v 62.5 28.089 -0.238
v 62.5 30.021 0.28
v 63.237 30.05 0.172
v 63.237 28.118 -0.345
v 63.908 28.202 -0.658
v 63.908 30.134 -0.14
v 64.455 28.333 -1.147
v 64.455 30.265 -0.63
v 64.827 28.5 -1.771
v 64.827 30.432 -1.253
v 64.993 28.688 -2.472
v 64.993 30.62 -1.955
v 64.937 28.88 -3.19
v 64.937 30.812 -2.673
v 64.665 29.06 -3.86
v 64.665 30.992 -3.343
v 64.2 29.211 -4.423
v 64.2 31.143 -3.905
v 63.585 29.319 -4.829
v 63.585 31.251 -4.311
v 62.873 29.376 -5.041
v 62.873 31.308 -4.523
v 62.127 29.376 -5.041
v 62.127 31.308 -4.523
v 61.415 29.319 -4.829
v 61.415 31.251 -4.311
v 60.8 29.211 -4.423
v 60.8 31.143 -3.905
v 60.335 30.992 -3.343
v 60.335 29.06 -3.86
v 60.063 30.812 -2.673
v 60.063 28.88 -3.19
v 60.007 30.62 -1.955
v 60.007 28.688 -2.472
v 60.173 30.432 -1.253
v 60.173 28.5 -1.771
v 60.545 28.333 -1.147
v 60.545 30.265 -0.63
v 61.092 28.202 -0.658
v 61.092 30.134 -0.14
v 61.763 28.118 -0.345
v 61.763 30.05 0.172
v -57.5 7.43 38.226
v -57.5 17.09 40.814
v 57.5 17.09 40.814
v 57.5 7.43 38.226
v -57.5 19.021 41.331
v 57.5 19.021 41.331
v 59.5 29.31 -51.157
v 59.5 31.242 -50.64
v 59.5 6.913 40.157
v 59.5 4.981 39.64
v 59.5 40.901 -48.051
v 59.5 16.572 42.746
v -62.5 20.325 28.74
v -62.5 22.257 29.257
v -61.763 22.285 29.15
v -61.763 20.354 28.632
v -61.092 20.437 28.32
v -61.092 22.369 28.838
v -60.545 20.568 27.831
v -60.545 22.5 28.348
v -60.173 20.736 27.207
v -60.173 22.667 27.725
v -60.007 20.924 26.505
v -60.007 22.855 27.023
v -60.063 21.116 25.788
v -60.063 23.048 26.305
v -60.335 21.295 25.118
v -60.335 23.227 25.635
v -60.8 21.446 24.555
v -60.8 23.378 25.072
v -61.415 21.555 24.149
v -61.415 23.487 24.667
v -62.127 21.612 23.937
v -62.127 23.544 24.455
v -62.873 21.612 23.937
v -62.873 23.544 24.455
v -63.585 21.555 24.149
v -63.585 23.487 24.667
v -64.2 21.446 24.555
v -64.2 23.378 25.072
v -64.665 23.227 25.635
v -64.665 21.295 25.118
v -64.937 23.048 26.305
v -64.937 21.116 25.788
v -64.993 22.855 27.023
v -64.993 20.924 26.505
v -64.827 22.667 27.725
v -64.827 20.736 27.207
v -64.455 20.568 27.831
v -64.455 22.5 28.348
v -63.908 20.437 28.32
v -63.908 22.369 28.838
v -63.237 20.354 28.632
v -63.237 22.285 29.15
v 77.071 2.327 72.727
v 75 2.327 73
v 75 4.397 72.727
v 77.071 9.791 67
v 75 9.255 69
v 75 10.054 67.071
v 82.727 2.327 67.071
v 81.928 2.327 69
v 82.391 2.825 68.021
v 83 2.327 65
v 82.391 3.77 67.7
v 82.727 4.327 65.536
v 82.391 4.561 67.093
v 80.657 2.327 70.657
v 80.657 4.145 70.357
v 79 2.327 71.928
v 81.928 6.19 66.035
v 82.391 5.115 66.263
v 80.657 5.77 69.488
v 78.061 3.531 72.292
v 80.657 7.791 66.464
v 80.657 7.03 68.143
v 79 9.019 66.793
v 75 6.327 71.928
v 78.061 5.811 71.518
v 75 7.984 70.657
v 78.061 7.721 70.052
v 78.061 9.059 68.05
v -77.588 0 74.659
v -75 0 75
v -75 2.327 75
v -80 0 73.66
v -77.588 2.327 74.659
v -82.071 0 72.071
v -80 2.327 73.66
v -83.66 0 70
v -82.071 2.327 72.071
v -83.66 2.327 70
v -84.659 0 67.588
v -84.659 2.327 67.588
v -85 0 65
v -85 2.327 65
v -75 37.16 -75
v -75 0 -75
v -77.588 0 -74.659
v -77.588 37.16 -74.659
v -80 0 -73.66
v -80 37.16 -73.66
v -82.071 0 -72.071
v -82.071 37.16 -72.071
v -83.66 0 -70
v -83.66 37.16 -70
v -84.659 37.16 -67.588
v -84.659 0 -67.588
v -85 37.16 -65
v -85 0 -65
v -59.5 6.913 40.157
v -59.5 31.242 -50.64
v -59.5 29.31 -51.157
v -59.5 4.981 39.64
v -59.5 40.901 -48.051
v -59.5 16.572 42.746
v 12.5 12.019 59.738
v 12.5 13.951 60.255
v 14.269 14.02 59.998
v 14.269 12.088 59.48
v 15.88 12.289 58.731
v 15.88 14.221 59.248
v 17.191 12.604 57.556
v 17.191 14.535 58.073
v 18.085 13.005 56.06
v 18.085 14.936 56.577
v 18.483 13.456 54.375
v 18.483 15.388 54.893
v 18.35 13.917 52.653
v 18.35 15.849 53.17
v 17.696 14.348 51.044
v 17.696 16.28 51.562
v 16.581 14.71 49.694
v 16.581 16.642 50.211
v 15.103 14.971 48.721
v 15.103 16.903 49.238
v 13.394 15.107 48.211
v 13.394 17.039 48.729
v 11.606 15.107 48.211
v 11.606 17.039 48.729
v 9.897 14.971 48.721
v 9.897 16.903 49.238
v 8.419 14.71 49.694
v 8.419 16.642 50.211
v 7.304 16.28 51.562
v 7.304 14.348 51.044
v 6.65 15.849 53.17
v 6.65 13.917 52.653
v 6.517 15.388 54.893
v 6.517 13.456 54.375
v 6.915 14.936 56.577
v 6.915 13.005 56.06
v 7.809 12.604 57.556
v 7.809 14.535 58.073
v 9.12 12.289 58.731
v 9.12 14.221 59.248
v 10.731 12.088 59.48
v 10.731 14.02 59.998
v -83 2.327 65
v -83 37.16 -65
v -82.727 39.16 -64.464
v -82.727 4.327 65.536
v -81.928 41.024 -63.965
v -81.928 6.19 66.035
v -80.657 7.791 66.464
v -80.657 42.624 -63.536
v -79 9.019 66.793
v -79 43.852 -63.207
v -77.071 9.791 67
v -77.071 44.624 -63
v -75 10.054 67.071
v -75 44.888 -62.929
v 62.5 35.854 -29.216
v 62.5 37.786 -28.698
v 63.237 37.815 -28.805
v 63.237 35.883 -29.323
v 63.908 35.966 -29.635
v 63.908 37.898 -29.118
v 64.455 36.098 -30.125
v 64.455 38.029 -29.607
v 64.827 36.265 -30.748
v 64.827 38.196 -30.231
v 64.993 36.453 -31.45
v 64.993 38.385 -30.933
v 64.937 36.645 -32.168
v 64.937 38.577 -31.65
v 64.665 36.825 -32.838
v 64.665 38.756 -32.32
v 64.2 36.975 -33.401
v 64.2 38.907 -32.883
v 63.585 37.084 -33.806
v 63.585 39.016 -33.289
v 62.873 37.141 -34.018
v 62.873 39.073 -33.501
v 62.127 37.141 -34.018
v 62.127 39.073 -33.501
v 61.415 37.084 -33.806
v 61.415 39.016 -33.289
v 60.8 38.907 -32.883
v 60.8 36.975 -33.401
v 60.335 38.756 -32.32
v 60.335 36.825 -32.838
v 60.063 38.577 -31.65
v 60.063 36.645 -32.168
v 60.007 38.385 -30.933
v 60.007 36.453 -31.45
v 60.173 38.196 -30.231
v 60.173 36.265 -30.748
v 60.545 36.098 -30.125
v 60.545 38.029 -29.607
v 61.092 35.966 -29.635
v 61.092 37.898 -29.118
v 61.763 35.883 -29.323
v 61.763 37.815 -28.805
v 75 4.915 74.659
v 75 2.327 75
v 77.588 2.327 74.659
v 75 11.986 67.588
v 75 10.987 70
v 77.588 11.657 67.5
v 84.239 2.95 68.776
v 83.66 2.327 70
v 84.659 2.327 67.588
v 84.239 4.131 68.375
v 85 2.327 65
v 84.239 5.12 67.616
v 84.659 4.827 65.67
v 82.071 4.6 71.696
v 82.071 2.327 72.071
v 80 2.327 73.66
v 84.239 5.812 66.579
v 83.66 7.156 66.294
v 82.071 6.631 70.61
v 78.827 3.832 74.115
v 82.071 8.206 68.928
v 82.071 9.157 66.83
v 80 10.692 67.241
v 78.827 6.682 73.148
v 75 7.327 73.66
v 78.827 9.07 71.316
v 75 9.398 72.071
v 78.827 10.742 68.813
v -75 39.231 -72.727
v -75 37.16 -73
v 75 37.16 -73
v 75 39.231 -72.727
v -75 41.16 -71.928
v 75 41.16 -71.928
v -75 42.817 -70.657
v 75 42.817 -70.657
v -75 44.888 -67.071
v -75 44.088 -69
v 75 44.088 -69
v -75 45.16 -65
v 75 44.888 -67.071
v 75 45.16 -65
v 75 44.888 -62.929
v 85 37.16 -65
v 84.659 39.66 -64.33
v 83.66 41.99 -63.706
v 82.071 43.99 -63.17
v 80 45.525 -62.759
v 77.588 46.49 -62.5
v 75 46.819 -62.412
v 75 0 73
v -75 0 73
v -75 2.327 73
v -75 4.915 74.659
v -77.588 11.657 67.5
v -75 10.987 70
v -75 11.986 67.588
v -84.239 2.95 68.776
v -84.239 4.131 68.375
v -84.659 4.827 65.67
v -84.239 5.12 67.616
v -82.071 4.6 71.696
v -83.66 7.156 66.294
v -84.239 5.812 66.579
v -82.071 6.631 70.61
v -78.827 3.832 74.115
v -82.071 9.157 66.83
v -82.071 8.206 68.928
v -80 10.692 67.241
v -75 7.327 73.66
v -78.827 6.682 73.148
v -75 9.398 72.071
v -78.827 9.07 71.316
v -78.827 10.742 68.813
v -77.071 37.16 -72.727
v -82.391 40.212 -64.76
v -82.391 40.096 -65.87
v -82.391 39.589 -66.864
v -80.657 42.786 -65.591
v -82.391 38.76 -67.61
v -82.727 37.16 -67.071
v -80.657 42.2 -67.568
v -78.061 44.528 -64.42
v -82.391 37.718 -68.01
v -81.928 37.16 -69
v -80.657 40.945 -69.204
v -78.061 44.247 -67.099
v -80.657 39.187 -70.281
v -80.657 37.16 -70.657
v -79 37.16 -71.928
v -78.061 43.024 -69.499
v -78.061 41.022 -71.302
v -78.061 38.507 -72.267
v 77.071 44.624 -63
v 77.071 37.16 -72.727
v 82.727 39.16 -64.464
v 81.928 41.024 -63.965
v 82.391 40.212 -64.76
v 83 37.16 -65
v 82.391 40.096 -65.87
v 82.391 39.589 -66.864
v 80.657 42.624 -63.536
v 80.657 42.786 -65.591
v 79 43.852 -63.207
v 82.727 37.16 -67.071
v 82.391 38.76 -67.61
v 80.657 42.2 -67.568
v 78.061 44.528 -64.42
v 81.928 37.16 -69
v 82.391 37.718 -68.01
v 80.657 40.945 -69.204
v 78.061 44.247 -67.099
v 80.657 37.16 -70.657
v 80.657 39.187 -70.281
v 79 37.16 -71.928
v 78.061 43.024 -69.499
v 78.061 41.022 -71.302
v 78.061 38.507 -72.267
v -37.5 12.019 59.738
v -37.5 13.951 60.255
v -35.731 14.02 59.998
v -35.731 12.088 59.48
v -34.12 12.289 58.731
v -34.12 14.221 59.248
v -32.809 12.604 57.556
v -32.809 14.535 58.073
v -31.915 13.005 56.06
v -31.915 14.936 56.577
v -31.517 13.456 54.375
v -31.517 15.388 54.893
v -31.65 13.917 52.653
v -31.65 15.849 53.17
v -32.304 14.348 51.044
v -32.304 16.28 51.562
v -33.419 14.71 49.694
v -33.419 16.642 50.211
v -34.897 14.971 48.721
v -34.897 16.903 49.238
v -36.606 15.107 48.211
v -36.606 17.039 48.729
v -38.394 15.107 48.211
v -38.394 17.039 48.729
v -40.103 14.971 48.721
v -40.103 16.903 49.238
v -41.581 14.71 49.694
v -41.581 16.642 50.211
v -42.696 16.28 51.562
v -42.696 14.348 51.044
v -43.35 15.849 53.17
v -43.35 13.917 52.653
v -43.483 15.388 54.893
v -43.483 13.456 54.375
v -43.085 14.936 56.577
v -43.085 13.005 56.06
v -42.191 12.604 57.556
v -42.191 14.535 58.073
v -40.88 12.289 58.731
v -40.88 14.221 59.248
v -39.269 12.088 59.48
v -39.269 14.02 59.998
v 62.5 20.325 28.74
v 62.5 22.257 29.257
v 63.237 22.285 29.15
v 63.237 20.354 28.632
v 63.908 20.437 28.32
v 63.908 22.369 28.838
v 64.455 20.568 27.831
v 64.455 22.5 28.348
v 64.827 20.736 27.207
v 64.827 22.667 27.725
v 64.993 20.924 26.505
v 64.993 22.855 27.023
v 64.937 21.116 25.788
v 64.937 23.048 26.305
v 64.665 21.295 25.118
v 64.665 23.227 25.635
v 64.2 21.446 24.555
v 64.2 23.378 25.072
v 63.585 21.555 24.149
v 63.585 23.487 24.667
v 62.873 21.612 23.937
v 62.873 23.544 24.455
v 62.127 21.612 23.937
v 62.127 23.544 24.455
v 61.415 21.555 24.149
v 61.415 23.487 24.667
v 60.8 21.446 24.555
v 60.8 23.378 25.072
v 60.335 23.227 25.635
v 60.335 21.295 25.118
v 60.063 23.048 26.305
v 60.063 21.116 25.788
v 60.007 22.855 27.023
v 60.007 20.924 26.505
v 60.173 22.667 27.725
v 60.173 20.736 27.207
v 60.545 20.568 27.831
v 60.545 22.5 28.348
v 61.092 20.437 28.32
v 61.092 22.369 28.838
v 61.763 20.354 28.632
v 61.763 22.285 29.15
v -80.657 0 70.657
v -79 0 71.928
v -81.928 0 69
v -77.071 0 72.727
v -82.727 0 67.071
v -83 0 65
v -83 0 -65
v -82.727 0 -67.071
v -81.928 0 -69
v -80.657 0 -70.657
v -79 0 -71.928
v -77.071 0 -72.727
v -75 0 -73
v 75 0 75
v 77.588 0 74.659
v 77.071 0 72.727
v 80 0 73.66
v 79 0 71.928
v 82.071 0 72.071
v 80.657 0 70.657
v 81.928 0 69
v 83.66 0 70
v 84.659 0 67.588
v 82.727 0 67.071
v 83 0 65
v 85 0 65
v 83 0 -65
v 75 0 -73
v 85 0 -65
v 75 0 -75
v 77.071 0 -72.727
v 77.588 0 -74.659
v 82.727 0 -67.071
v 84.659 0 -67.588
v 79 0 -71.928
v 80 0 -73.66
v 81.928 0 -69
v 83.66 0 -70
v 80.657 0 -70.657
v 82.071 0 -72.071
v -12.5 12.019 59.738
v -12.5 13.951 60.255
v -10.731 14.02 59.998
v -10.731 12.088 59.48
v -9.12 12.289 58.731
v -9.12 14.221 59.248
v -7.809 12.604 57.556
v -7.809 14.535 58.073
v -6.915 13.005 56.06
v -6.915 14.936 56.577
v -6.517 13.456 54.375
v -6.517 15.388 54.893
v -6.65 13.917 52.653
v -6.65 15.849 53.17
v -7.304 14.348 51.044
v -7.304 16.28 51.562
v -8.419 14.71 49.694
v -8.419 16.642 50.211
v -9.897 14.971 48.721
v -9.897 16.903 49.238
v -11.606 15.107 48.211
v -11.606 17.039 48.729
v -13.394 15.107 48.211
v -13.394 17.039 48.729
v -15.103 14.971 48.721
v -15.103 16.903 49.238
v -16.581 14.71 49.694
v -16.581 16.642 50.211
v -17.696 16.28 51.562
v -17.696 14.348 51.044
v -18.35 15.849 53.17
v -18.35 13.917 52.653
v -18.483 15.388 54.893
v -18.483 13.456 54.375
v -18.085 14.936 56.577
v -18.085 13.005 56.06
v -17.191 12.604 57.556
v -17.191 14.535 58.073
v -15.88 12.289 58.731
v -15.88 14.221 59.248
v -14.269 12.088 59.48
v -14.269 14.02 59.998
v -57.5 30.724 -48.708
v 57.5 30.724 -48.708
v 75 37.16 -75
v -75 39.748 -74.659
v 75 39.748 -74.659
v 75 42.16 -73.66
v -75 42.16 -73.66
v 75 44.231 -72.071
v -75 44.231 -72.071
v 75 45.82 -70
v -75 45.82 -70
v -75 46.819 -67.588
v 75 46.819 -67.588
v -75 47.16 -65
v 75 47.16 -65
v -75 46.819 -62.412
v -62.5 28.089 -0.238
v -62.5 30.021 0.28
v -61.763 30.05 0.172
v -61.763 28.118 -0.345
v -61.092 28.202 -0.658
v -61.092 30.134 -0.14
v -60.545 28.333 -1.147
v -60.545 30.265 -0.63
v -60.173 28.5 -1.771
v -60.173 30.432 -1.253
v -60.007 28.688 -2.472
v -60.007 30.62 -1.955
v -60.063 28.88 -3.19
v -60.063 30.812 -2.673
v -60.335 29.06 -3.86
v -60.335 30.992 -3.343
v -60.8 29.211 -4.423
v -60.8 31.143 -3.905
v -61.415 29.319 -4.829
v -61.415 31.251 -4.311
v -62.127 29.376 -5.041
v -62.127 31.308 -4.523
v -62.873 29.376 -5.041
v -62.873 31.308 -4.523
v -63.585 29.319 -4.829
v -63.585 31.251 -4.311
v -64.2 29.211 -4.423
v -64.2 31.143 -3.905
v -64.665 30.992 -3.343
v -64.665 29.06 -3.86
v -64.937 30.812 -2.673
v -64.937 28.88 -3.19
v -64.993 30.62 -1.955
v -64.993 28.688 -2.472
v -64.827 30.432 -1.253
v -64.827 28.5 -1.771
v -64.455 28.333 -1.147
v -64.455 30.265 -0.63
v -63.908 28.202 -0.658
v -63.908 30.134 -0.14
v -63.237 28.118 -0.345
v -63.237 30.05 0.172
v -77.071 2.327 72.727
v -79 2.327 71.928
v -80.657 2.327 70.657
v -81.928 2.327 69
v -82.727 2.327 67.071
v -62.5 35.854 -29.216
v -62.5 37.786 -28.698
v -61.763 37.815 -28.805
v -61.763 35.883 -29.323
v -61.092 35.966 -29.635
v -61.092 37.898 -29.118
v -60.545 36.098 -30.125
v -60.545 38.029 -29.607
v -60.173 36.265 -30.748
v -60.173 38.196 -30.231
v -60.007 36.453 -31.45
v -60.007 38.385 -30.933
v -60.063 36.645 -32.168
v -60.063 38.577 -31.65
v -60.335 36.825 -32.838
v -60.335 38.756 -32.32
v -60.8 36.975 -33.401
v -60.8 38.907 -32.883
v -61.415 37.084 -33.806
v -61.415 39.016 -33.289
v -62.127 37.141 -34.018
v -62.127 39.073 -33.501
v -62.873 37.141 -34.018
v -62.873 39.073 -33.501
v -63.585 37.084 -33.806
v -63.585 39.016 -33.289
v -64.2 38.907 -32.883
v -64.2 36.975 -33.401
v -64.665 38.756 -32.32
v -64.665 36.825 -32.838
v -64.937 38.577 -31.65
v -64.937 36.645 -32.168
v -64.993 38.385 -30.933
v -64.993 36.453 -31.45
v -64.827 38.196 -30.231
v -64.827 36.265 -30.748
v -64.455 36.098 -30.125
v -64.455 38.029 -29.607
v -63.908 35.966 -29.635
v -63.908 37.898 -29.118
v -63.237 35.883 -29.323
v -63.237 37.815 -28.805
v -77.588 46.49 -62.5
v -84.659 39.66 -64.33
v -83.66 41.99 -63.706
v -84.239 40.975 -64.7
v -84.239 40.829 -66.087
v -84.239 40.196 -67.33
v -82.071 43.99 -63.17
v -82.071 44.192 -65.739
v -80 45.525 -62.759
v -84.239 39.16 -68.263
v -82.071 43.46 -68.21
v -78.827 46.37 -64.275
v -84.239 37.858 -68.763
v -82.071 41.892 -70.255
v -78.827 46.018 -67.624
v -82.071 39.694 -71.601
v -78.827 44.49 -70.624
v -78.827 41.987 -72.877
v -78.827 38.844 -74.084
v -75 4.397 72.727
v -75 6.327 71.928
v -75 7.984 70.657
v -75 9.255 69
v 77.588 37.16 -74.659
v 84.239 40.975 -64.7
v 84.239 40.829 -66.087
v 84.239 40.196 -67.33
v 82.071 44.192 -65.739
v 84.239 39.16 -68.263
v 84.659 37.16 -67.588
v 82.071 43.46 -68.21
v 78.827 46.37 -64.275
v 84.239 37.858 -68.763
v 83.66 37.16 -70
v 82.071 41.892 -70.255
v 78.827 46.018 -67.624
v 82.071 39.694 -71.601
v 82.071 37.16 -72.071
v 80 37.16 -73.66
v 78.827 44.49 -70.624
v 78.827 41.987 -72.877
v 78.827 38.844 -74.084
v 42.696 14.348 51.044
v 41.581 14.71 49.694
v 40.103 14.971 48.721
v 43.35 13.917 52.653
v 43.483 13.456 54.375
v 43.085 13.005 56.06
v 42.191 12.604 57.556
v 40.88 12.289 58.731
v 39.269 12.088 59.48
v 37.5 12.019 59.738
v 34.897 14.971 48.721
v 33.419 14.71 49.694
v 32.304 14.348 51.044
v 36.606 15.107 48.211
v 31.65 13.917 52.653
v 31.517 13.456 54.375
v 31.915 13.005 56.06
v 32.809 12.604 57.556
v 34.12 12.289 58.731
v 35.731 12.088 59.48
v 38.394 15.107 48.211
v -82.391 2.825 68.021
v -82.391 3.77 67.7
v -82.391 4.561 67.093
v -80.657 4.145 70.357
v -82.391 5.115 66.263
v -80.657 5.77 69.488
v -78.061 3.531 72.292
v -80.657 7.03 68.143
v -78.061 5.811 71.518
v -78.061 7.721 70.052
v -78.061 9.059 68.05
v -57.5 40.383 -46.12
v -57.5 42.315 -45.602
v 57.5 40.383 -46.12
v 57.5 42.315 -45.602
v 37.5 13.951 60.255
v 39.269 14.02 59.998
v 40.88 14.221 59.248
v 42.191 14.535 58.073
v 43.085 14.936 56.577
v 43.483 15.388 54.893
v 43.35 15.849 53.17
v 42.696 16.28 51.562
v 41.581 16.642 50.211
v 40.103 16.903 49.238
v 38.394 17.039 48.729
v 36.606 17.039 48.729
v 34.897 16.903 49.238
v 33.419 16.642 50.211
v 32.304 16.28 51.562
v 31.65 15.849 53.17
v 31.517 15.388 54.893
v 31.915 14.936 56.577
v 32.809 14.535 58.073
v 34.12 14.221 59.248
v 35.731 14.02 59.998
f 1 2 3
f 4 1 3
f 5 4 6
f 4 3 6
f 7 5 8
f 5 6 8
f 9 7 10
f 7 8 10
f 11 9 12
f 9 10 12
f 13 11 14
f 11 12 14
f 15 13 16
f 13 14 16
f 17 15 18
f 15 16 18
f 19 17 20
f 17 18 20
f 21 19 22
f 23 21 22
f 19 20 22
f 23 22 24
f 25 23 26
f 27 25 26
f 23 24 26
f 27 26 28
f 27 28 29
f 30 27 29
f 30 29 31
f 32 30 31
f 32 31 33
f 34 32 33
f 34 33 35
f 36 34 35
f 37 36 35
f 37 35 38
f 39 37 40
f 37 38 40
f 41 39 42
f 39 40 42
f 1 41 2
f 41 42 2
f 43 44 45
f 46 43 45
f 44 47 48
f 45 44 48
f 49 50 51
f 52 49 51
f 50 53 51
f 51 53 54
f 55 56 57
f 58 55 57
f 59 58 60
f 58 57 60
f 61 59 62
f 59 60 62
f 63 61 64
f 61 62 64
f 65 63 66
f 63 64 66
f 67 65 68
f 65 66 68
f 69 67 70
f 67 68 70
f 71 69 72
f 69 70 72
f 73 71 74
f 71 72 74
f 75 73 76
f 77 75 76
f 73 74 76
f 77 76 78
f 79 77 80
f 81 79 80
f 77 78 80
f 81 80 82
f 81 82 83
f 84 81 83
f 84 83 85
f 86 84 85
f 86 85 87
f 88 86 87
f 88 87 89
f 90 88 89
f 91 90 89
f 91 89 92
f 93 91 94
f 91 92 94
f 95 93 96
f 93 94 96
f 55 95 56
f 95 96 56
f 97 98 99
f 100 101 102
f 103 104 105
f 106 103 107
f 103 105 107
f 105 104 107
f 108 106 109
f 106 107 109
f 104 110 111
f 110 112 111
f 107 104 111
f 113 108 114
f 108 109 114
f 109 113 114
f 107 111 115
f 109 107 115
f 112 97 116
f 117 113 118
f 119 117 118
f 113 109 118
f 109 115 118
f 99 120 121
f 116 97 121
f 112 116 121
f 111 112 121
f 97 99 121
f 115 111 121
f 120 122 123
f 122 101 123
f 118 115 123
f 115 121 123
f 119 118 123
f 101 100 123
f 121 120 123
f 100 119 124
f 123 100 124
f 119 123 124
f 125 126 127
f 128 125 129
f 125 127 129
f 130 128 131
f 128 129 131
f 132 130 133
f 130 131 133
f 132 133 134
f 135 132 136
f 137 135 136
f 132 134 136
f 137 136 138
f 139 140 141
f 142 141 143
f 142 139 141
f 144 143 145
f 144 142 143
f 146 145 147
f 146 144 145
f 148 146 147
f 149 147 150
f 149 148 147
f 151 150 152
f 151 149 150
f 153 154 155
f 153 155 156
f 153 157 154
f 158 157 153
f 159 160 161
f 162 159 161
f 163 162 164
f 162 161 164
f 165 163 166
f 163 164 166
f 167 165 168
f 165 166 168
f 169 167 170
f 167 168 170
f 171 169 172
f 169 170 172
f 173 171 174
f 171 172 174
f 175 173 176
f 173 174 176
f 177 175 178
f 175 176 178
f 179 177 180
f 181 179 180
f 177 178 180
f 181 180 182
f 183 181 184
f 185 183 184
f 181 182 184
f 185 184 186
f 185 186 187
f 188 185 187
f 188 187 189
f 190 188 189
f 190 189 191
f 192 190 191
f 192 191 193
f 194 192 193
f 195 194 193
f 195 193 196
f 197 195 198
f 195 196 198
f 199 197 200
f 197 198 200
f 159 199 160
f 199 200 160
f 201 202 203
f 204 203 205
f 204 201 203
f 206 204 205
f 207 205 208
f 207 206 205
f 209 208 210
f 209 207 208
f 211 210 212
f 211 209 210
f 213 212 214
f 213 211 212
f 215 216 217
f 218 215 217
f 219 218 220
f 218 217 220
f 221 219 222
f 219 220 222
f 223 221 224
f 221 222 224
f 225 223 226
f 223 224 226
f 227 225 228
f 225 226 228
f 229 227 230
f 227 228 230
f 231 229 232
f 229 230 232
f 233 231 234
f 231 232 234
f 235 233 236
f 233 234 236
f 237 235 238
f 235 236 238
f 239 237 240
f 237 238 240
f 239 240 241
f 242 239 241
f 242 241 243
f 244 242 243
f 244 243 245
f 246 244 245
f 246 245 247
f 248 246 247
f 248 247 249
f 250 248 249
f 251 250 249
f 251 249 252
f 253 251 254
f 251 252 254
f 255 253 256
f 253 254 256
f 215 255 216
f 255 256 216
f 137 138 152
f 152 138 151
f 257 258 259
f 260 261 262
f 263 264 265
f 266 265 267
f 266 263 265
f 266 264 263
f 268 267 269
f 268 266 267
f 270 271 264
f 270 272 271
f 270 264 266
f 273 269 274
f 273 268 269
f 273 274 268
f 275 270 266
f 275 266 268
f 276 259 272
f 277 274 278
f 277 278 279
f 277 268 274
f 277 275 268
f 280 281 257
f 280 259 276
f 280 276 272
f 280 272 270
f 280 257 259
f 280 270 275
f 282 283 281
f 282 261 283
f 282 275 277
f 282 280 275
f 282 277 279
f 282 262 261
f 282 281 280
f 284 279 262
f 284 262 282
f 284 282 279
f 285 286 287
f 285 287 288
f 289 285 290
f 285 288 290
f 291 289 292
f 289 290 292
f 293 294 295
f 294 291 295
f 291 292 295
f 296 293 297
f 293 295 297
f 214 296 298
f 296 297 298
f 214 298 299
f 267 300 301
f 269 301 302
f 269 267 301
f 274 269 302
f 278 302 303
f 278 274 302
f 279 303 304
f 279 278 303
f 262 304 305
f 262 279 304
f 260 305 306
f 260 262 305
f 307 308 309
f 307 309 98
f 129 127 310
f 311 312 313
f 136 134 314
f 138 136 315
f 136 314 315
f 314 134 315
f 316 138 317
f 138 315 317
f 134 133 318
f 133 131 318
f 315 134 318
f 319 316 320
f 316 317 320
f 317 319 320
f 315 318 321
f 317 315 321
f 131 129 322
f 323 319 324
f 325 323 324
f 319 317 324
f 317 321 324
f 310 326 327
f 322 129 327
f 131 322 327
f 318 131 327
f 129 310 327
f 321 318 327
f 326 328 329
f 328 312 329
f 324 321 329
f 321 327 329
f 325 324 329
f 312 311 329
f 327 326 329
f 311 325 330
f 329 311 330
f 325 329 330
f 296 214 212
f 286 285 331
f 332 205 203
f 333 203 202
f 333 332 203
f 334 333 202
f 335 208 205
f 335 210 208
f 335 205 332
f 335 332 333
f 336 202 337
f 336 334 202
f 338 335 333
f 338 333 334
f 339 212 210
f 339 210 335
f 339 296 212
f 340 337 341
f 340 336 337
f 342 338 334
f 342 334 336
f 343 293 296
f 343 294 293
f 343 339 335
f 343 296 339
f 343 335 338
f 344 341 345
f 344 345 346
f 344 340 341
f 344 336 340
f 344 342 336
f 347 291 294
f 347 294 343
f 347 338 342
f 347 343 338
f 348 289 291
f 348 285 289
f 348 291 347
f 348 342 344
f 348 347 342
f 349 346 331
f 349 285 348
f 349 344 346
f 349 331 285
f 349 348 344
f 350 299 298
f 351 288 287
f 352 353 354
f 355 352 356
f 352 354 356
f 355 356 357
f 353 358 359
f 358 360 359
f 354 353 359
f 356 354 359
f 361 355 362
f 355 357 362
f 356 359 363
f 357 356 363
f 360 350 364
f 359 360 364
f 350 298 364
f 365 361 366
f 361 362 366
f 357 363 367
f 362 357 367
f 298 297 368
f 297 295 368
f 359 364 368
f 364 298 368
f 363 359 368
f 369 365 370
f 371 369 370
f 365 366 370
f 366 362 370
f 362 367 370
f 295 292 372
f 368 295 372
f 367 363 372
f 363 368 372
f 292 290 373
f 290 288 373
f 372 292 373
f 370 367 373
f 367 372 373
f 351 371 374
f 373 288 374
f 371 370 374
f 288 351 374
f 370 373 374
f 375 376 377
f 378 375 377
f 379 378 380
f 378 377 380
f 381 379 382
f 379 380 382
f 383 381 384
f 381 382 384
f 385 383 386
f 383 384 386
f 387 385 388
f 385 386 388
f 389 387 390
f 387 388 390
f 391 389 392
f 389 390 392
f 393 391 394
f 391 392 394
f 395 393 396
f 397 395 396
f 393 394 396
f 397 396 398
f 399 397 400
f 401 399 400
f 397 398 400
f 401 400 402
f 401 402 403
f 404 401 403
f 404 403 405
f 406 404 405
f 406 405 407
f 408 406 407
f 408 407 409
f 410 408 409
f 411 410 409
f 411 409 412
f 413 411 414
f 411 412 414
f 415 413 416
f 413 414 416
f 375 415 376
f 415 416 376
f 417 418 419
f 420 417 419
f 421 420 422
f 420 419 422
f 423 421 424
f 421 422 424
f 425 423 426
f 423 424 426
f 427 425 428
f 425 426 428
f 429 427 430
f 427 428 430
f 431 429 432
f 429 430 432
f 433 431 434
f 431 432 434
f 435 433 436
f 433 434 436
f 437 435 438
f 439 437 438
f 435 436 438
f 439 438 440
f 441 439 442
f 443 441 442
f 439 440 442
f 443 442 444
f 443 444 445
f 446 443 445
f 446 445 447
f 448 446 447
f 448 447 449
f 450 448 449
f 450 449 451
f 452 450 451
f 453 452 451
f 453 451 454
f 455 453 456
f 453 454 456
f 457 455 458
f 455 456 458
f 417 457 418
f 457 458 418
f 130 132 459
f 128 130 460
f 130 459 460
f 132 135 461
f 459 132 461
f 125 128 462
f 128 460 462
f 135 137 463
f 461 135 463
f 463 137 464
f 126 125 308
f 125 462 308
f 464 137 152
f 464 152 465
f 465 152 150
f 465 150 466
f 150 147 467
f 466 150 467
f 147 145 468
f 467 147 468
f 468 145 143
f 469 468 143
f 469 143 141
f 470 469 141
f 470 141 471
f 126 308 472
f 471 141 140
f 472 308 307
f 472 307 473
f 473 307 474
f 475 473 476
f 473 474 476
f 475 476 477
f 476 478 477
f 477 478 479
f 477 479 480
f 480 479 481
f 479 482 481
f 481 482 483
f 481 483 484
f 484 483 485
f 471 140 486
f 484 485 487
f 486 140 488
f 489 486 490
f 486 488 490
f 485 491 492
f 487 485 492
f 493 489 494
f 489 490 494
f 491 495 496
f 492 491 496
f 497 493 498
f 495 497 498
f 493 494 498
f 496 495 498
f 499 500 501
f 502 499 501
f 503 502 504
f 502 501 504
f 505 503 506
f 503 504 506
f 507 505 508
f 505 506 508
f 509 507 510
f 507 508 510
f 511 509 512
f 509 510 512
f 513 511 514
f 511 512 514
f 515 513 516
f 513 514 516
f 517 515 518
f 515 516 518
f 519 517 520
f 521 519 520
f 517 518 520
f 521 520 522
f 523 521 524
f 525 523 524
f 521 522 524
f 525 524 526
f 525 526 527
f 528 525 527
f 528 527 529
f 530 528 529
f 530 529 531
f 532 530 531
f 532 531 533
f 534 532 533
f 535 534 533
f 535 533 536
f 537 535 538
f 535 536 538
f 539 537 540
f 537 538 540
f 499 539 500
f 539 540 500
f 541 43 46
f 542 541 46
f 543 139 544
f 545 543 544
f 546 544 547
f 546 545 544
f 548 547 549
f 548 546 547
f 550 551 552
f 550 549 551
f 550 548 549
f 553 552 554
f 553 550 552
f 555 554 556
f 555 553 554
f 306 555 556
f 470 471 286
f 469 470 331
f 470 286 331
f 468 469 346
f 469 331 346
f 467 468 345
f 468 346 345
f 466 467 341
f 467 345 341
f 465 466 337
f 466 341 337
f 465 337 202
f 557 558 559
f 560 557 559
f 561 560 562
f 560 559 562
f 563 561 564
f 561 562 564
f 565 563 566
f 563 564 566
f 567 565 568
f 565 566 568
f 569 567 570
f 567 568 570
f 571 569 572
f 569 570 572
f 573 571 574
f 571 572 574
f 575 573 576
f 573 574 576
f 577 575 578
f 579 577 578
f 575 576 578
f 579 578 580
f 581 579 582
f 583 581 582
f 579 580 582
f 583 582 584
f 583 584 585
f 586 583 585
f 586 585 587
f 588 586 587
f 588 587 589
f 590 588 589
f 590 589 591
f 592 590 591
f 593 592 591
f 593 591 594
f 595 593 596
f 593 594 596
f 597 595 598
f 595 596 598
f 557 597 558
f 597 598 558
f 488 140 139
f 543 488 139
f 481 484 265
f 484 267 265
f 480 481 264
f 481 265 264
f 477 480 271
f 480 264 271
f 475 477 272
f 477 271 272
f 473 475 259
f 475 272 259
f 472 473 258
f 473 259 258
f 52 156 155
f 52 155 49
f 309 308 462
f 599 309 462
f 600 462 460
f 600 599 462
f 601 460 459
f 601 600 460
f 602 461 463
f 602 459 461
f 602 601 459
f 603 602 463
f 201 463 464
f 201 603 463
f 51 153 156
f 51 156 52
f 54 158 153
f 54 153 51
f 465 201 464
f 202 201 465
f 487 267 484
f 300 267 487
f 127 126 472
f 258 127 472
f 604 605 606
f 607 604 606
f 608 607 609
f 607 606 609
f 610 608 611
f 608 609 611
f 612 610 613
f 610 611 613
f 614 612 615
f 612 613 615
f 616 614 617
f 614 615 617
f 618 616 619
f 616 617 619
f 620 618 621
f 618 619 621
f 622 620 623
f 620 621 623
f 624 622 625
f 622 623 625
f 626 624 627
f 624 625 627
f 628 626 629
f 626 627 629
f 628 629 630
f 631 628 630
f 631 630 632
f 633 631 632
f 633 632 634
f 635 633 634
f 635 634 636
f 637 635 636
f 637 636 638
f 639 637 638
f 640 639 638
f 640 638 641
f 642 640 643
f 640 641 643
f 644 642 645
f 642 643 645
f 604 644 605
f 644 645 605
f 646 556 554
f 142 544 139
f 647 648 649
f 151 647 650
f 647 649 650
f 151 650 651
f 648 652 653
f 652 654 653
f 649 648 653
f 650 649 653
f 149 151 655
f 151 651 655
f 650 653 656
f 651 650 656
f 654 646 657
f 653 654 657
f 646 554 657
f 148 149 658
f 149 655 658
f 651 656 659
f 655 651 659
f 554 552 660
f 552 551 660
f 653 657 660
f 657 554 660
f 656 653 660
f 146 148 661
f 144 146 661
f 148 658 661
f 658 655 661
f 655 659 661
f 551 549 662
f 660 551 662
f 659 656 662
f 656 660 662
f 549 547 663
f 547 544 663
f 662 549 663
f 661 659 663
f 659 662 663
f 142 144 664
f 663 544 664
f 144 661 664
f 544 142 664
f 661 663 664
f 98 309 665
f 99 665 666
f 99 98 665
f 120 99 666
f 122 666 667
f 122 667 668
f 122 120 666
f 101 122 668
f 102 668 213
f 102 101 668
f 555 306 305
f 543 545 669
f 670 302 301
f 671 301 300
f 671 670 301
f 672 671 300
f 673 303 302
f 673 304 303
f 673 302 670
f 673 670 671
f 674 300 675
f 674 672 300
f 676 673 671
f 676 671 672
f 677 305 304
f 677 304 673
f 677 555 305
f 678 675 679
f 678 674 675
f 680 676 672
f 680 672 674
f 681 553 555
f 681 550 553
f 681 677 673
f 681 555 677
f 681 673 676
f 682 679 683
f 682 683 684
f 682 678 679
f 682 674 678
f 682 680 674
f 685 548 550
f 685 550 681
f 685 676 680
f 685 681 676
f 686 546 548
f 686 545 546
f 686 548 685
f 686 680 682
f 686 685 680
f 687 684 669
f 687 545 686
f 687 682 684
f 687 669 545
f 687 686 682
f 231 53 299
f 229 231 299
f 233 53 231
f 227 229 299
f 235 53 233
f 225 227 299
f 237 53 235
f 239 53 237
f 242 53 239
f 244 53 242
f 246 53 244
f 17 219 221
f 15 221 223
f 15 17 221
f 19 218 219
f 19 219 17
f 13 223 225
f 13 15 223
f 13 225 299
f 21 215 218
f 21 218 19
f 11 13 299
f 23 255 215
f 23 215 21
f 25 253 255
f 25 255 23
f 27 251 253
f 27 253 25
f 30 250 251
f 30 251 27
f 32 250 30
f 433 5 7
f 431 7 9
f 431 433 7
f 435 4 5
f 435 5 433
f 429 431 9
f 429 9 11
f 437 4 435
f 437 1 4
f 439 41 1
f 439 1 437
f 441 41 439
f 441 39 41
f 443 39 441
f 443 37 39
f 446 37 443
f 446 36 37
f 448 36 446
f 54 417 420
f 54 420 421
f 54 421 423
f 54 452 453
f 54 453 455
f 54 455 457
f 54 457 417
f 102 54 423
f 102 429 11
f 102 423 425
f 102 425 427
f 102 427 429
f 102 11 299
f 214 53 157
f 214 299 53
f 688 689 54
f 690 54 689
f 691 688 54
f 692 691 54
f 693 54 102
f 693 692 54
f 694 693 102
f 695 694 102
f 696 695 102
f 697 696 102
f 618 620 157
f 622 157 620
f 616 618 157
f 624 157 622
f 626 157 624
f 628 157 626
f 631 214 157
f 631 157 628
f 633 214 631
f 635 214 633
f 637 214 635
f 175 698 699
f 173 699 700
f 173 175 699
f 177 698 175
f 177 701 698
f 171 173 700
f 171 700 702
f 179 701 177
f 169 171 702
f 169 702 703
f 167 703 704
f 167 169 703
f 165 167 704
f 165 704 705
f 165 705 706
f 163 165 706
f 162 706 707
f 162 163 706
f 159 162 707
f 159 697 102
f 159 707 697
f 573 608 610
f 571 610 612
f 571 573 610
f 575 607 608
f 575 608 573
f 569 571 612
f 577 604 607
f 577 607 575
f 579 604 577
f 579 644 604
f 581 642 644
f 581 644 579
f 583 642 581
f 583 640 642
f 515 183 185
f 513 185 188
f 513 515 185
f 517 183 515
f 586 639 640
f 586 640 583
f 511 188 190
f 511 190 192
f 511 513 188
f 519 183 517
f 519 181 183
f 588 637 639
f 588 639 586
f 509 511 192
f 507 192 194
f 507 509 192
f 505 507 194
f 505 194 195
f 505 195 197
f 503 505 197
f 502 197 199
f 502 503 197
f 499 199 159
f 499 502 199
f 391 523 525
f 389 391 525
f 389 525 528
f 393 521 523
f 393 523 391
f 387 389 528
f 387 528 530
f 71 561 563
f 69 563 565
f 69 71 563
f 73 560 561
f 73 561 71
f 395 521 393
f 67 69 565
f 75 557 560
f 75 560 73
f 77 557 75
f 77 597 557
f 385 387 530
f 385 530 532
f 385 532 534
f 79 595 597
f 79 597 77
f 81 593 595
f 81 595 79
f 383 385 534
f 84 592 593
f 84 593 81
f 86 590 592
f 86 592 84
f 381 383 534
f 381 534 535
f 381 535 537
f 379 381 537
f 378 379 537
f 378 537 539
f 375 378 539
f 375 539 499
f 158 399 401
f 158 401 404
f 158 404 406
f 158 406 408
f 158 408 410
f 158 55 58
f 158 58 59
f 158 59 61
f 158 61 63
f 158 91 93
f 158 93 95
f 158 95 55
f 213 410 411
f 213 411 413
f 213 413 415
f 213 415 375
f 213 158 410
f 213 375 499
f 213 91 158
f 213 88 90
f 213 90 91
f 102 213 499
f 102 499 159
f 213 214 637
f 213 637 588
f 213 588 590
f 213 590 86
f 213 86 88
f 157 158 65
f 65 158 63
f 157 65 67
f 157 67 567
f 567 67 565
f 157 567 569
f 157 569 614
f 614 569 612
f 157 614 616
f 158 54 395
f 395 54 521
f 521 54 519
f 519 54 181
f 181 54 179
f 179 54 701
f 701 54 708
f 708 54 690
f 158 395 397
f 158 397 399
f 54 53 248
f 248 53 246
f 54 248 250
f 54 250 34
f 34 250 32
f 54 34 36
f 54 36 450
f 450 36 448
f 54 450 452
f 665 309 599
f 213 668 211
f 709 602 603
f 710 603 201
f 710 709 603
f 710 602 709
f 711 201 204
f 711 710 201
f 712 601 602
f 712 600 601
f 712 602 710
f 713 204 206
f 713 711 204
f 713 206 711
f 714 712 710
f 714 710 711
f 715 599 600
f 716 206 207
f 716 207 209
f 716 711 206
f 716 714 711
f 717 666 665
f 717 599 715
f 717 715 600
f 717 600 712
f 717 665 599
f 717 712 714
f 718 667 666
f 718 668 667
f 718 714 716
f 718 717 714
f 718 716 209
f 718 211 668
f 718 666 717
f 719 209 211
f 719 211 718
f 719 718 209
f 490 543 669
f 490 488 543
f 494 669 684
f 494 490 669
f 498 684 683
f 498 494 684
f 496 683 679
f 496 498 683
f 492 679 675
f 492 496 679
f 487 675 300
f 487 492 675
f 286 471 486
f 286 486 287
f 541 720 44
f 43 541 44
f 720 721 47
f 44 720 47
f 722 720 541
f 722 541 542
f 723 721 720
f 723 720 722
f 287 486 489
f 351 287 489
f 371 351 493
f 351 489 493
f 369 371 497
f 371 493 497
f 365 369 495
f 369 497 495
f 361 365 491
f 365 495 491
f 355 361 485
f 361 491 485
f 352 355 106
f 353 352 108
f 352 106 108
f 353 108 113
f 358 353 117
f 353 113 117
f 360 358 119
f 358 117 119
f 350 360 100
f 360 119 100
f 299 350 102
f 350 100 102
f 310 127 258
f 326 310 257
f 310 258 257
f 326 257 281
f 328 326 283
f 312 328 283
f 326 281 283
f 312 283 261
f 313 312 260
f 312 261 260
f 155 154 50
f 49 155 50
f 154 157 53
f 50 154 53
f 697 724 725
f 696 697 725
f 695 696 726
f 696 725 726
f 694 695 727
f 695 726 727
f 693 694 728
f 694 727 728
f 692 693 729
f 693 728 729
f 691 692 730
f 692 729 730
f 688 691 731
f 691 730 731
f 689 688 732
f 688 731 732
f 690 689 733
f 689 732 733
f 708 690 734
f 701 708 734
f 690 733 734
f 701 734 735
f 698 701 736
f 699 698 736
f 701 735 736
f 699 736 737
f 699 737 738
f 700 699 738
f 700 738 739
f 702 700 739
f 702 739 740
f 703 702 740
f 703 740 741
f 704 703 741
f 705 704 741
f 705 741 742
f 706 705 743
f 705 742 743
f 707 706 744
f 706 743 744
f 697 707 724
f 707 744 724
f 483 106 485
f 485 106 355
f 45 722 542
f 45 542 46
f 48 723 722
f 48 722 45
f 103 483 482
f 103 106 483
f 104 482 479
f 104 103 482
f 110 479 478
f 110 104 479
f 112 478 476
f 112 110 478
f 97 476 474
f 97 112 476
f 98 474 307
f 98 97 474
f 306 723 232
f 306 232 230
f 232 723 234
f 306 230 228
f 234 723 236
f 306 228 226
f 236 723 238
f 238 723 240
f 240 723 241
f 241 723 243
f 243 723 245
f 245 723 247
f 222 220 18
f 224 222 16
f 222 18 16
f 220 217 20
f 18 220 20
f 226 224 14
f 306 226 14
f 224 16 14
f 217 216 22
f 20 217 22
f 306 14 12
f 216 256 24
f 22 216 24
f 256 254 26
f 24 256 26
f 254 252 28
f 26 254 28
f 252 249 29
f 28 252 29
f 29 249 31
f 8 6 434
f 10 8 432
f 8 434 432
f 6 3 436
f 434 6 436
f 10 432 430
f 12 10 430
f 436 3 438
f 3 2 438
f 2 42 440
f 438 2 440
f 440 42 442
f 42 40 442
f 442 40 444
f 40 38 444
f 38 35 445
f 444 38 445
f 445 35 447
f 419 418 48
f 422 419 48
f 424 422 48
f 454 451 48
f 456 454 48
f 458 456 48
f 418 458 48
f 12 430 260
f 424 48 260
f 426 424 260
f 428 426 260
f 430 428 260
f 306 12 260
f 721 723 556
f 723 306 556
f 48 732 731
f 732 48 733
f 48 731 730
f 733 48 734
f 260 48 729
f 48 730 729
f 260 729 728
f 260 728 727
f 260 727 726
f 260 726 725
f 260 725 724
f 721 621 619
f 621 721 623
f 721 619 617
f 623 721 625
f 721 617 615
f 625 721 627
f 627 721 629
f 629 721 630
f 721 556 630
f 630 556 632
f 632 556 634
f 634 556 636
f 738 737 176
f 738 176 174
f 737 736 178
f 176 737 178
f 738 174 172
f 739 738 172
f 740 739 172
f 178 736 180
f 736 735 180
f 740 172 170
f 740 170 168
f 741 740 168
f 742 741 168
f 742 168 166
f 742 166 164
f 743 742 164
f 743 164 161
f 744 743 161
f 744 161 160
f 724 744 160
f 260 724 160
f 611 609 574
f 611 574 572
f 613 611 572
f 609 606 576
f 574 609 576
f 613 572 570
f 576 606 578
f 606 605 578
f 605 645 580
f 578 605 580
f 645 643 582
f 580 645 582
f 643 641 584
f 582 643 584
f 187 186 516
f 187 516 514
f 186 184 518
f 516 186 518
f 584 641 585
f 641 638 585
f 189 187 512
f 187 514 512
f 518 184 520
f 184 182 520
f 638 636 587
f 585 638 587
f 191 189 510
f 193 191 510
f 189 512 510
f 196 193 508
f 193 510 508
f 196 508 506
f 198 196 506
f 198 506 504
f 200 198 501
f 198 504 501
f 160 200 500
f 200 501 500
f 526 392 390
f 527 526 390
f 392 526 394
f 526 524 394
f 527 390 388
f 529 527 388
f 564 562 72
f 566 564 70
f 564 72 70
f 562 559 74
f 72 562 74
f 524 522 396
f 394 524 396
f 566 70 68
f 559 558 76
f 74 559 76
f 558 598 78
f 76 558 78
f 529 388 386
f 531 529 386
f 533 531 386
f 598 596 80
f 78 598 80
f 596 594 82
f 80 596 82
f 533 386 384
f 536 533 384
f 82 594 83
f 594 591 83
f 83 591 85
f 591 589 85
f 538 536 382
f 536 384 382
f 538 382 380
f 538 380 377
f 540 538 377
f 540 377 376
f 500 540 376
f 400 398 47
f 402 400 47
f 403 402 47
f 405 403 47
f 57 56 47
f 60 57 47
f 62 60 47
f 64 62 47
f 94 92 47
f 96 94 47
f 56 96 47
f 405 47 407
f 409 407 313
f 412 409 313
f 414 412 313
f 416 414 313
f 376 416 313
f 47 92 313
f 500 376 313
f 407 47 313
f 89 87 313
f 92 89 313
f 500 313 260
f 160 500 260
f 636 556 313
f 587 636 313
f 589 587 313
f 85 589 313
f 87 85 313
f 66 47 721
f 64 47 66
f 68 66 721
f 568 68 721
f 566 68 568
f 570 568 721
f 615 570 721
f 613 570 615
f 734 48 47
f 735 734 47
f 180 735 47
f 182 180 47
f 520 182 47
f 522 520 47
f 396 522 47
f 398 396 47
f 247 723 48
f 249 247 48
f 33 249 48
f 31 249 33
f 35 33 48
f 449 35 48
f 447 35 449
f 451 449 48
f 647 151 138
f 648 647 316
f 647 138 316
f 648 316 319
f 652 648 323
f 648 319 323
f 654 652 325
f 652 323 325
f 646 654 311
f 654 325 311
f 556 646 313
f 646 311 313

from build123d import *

# Parameters (mm, degrees)
SKETCH1_W           = 170
SKETCH1_H           = 150
BOSS_EXTRUDE1_DEPTH = 10
BOSS_EXTRUDE2_DEPTH = 170
FILLET1_R           = 10
SHELL1_T            = -2
SKETCH3_W           = 115
SKETCH3_H           = 90
CUT_EXTRUDE1_DEPTH  = 2
SKETCH4_W           = 119
SKETCH4_H           = 94
SKETCH4_W_2         = 115
SKETCH4_H_2         = 90
BOSS_EXTRUDE3_DEPTH = 10
SKETCH5_W           = 119
SKETCH5_H           = 94
BOSS_EXTRUDE4_DEPTH = 2
SKETCH6_R           = 2.5
CUT_EXTRUDE2_DEPTH  = 2
SKETCH7_R           = 6
CUT_EXTRUDE3_DEPTH  = 2


with BuildPart() as part:
    # Sketch1 → Boss-Extrude1 (new body)
    with BuildSketch(Plane(origin=(0, 0, 0), x_dir=(1, 0, 0), z_dir=(0, 1, 0))):
        Rectangle(SKETCH1_W, SKETCH1_H)
    extrude(amount=BOSS_EXTRUDE1_DEPTH)

    # Sketch2 → Boss-Extrude2 (add)
    with BuildSketch(Plane.ZY.offset(85)):
        Polygon((-75, 10), (-75, 50.192378865), (75, 10), align=None)
    extrude(amount=-BOSS_EXTRUDE2_DEPTH)

    # Fillet1
    fillet1_edges = [part.edges().sort_by_distance(p)[0] for p in [
        (0, 50.192378865, -75),
        (-85, 30.096189432, 0),
        (85, 30.096189432, 0),
        (0, 10, 75),
        (85, 5, 75),
        (-85, 5, 75),
        (-85, 25.096189432, -75),
        (85, 25.096189432, -75),
    ]]
    fillet(fillet1_edges, radius=FILLET1_R)

    # Shell1
    shell1_openings = [part.faces().sort_by_distance(p)[0] for p in [
        (0, 0, 0),
    ]]
    offset(amount=SHELL1_T, openings=shell1_openings, kind=Kind.INTERSECTION)

    # Sketch3 → Cut-Extrude1 (cut)
    with BuildSketch(Plane(origin=(0, 28.080127019, 7.524047358), x_dir=(1, 0, 0), z_dir=(0, 0.96592582628907, 0.25881904510251436))):
        with Locations((0, 10)):
            Rectangle(SKETCH3_W, SKETCH3_H)
    extrude(amount=-CUT_EXTRUDE1_DEPTH, mode=Mode.SUBTRACT)

    # Sketch4 → Boss-Extrude3 (add)
    with BuildSketch(Plane(origin=(0, 26.148275366, 7.006409268), x_dir=(1, 0, 0), z_dir=(0, -0.96592582628907, -0.25881904510251436))):
        with Locations((0, -10)):
            Rectangle(SKETCH4_W, SKETCH4_H)
        with Locations((0, -10)):
            Rectangle(SKETCH4_W_2, SKETCH4_H_2, mode=Mode.SUBTRACT)
    extrude(amount=BOSS_EXTRUDE3_DEPTH)

    # Sketch5 → Boss-Extrude4 (add)
    with BuildSketch(Plane(origin=(0, 16.489017103, 4.418218817), x_dir=(1, 0, 0), z_dir=(0, -0.96592582628907, -0.25881904510251436))):
        with Locations((0, -10)):
            Rectangle(SKETCH5_W, SKETCH5_H)
    extrude(amount=BOSS_EXTRUDE4_DEPTH)

    # Sketch6 → Cut-Extrude2 (cut)
    with BuildSketch(Plane(origin=(0, 28.080127019, 7.524047358), x_dir=(1, 0, 0), z_dir=(0, 0.96592582628907, 0.25881904510251436))):
        with Locations(Location((-62.5, 10, 0), (0, 0, 270))):
            Circle(SKETCH6_R)
        with Locations(Location((-62.5, 40, 0), (0, 0, 270))):
            Circle(SKETCH6_R)
        with Locations(Location((-62.5, -20, 0), (0, 0, 270))):
            Circle(SKETCH6_R)
        with Locations(Location((62.5, -20, 0), (0, 0, 270))):
            Circle(SKETCH6_R)
        with Locations(Location((62.5, 40, 0), (0, 0, 270))):
            Circle(SKETCH6_R)
        with Locations(Location((62.5, 10, 0), (0, 0, 270))):
            Circle(SKETCH6_R)
    extrude(amount=-CUT_EXTRUDE2_DEPTH, mode=Mode.SUBTRACT)

    # Sketch7 → Cut-Extrude3 (cut)
    with BuildSketch(Plane(origin=(0, 28.080127019, 7.524047358), x_dir=(1, 0, 0), z_dir=(0, 0.96592582628907, 0.25881904510251436))):
        with Locations(Location((-12.5, -48.59148832, 0), (0, 0, 270))):
            Circle(SKETCH7_R)
        with Locations(Location((12.5, -48.59148832, 0), (0, 0, 270))):
            Circle(SKETCH7_R)
        with Locations(Location((37.5, -48.59148832, 0), (0, 0, 270))):
            Circle(SKETCH7_R)
        with Locations(Location((-37.5, -48.59148832, 0), (0, 0, 270))):
            Circle(SKETCH7_R)
    extrude(amount=-CUT_EXTRUDE3_DEPTH, mode=Mode.SUBTRACT)


solid = part.part
